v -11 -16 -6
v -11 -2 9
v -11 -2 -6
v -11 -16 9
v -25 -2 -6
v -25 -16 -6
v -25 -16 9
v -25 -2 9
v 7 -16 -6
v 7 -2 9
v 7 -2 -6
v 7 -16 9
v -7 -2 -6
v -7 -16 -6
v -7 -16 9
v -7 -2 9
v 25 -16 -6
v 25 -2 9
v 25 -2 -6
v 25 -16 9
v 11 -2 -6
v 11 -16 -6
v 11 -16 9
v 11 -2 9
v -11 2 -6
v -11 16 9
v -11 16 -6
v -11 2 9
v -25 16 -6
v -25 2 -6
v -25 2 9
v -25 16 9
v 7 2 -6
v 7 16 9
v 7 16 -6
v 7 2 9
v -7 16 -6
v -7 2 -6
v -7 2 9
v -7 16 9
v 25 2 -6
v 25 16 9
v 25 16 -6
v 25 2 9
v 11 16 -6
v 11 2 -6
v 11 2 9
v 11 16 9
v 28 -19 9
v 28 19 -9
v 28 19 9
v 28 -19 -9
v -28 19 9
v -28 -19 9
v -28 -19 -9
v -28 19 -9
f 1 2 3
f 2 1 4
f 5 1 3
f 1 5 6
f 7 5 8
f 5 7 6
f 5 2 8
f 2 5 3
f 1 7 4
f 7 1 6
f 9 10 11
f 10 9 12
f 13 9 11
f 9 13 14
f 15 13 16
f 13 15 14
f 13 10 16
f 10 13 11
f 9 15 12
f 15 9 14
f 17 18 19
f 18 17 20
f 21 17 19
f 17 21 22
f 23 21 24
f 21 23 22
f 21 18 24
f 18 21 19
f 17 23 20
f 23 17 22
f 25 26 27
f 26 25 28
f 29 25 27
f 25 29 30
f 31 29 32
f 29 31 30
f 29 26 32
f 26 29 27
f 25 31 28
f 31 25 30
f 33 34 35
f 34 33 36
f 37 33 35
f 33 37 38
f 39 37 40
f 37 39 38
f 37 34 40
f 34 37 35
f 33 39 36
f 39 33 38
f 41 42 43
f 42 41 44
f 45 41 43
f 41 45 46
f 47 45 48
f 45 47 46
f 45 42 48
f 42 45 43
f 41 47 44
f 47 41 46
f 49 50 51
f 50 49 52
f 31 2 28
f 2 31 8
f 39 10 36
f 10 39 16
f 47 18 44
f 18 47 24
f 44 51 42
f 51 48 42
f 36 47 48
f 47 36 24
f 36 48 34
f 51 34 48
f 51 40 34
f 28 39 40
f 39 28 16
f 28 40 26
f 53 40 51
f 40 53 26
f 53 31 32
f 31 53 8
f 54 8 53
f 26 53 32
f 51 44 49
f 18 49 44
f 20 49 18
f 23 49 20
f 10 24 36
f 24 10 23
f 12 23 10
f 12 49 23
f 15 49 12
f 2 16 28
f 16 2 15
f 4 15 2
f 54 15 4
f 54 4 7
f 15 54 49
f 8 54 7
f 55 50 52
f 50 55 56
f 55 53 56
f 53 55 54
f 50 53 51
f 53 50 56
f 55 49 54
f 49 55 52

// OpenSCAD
$fn = 32;

// ----------------------------------------------------------------------
// Pocket plate 56 x 38 x 18
// 2 x 3 pockets 14 mm square, 15 mm deep
// ----------------------------------------------------------------------

// --- parameters (mm) ---
thickness = 18;  // plate thickness
floor_t = 3;     // material left under each pocket
pocket = 14;     // pocket side length
pitch_x = 18;    // pocket pitch along X
pitch_y = 18;    // pocket pitch along Y
cols = 3;        // pockets per row
rows = 2;        // rows of pockets

// --- derived feature positions (mm) ---
depth = thickness - floor_t;        // = 15   pocket depth, down to the floor
span_x = (cols - 1) * pitch_x;      // = 36   distance between outer pockets
span_y = (rows - 1) * pitch_y;      // = 18   distance between outer pocket rows
origin_x = -span_x / 2;             // = -18   X of the first pocket
origin_y = -span_y / 2;             // = -9   Y of the first pocket
plate = [span_x + pocket + 6, span_y + pocket + 6, thickness];  // = [56, 38, 18]   overall size: pockets plus 3 mm of wall on each side
feature_centers = [
  [origin_x + 0 * pitch_x, origin_y + 0 * pitch_y],
  [origin_x + 1 * pitch_x, origin_y + 0 * pitch_y],
  [origin_x + 2 * pitch_x, origin_y + 0 * pitch_y],
  [origin_x + 0 * pitch_x, origin_y + 1 * pitch_y],
  [origin_x + 1 * pitch_x, origin_y + 1 * pitch_y],
  [origin_x + 2 * pitch_x, origin_y + 1 * pitch_y]
];   // pocket centres, used verbatim by the cutter loop

// plate outline, then one pocket per centre in feature_centers
difference() {
  cube(plate, center = true);
  for (centre = feature_centers)
    translate([centre[0] - pocket / 2, centre[1] - pocket / 2, plate[2] / 2 - depth])
      cube([pocket, pocket, depth + 1]);  // centred on the declared pocket centre
}
